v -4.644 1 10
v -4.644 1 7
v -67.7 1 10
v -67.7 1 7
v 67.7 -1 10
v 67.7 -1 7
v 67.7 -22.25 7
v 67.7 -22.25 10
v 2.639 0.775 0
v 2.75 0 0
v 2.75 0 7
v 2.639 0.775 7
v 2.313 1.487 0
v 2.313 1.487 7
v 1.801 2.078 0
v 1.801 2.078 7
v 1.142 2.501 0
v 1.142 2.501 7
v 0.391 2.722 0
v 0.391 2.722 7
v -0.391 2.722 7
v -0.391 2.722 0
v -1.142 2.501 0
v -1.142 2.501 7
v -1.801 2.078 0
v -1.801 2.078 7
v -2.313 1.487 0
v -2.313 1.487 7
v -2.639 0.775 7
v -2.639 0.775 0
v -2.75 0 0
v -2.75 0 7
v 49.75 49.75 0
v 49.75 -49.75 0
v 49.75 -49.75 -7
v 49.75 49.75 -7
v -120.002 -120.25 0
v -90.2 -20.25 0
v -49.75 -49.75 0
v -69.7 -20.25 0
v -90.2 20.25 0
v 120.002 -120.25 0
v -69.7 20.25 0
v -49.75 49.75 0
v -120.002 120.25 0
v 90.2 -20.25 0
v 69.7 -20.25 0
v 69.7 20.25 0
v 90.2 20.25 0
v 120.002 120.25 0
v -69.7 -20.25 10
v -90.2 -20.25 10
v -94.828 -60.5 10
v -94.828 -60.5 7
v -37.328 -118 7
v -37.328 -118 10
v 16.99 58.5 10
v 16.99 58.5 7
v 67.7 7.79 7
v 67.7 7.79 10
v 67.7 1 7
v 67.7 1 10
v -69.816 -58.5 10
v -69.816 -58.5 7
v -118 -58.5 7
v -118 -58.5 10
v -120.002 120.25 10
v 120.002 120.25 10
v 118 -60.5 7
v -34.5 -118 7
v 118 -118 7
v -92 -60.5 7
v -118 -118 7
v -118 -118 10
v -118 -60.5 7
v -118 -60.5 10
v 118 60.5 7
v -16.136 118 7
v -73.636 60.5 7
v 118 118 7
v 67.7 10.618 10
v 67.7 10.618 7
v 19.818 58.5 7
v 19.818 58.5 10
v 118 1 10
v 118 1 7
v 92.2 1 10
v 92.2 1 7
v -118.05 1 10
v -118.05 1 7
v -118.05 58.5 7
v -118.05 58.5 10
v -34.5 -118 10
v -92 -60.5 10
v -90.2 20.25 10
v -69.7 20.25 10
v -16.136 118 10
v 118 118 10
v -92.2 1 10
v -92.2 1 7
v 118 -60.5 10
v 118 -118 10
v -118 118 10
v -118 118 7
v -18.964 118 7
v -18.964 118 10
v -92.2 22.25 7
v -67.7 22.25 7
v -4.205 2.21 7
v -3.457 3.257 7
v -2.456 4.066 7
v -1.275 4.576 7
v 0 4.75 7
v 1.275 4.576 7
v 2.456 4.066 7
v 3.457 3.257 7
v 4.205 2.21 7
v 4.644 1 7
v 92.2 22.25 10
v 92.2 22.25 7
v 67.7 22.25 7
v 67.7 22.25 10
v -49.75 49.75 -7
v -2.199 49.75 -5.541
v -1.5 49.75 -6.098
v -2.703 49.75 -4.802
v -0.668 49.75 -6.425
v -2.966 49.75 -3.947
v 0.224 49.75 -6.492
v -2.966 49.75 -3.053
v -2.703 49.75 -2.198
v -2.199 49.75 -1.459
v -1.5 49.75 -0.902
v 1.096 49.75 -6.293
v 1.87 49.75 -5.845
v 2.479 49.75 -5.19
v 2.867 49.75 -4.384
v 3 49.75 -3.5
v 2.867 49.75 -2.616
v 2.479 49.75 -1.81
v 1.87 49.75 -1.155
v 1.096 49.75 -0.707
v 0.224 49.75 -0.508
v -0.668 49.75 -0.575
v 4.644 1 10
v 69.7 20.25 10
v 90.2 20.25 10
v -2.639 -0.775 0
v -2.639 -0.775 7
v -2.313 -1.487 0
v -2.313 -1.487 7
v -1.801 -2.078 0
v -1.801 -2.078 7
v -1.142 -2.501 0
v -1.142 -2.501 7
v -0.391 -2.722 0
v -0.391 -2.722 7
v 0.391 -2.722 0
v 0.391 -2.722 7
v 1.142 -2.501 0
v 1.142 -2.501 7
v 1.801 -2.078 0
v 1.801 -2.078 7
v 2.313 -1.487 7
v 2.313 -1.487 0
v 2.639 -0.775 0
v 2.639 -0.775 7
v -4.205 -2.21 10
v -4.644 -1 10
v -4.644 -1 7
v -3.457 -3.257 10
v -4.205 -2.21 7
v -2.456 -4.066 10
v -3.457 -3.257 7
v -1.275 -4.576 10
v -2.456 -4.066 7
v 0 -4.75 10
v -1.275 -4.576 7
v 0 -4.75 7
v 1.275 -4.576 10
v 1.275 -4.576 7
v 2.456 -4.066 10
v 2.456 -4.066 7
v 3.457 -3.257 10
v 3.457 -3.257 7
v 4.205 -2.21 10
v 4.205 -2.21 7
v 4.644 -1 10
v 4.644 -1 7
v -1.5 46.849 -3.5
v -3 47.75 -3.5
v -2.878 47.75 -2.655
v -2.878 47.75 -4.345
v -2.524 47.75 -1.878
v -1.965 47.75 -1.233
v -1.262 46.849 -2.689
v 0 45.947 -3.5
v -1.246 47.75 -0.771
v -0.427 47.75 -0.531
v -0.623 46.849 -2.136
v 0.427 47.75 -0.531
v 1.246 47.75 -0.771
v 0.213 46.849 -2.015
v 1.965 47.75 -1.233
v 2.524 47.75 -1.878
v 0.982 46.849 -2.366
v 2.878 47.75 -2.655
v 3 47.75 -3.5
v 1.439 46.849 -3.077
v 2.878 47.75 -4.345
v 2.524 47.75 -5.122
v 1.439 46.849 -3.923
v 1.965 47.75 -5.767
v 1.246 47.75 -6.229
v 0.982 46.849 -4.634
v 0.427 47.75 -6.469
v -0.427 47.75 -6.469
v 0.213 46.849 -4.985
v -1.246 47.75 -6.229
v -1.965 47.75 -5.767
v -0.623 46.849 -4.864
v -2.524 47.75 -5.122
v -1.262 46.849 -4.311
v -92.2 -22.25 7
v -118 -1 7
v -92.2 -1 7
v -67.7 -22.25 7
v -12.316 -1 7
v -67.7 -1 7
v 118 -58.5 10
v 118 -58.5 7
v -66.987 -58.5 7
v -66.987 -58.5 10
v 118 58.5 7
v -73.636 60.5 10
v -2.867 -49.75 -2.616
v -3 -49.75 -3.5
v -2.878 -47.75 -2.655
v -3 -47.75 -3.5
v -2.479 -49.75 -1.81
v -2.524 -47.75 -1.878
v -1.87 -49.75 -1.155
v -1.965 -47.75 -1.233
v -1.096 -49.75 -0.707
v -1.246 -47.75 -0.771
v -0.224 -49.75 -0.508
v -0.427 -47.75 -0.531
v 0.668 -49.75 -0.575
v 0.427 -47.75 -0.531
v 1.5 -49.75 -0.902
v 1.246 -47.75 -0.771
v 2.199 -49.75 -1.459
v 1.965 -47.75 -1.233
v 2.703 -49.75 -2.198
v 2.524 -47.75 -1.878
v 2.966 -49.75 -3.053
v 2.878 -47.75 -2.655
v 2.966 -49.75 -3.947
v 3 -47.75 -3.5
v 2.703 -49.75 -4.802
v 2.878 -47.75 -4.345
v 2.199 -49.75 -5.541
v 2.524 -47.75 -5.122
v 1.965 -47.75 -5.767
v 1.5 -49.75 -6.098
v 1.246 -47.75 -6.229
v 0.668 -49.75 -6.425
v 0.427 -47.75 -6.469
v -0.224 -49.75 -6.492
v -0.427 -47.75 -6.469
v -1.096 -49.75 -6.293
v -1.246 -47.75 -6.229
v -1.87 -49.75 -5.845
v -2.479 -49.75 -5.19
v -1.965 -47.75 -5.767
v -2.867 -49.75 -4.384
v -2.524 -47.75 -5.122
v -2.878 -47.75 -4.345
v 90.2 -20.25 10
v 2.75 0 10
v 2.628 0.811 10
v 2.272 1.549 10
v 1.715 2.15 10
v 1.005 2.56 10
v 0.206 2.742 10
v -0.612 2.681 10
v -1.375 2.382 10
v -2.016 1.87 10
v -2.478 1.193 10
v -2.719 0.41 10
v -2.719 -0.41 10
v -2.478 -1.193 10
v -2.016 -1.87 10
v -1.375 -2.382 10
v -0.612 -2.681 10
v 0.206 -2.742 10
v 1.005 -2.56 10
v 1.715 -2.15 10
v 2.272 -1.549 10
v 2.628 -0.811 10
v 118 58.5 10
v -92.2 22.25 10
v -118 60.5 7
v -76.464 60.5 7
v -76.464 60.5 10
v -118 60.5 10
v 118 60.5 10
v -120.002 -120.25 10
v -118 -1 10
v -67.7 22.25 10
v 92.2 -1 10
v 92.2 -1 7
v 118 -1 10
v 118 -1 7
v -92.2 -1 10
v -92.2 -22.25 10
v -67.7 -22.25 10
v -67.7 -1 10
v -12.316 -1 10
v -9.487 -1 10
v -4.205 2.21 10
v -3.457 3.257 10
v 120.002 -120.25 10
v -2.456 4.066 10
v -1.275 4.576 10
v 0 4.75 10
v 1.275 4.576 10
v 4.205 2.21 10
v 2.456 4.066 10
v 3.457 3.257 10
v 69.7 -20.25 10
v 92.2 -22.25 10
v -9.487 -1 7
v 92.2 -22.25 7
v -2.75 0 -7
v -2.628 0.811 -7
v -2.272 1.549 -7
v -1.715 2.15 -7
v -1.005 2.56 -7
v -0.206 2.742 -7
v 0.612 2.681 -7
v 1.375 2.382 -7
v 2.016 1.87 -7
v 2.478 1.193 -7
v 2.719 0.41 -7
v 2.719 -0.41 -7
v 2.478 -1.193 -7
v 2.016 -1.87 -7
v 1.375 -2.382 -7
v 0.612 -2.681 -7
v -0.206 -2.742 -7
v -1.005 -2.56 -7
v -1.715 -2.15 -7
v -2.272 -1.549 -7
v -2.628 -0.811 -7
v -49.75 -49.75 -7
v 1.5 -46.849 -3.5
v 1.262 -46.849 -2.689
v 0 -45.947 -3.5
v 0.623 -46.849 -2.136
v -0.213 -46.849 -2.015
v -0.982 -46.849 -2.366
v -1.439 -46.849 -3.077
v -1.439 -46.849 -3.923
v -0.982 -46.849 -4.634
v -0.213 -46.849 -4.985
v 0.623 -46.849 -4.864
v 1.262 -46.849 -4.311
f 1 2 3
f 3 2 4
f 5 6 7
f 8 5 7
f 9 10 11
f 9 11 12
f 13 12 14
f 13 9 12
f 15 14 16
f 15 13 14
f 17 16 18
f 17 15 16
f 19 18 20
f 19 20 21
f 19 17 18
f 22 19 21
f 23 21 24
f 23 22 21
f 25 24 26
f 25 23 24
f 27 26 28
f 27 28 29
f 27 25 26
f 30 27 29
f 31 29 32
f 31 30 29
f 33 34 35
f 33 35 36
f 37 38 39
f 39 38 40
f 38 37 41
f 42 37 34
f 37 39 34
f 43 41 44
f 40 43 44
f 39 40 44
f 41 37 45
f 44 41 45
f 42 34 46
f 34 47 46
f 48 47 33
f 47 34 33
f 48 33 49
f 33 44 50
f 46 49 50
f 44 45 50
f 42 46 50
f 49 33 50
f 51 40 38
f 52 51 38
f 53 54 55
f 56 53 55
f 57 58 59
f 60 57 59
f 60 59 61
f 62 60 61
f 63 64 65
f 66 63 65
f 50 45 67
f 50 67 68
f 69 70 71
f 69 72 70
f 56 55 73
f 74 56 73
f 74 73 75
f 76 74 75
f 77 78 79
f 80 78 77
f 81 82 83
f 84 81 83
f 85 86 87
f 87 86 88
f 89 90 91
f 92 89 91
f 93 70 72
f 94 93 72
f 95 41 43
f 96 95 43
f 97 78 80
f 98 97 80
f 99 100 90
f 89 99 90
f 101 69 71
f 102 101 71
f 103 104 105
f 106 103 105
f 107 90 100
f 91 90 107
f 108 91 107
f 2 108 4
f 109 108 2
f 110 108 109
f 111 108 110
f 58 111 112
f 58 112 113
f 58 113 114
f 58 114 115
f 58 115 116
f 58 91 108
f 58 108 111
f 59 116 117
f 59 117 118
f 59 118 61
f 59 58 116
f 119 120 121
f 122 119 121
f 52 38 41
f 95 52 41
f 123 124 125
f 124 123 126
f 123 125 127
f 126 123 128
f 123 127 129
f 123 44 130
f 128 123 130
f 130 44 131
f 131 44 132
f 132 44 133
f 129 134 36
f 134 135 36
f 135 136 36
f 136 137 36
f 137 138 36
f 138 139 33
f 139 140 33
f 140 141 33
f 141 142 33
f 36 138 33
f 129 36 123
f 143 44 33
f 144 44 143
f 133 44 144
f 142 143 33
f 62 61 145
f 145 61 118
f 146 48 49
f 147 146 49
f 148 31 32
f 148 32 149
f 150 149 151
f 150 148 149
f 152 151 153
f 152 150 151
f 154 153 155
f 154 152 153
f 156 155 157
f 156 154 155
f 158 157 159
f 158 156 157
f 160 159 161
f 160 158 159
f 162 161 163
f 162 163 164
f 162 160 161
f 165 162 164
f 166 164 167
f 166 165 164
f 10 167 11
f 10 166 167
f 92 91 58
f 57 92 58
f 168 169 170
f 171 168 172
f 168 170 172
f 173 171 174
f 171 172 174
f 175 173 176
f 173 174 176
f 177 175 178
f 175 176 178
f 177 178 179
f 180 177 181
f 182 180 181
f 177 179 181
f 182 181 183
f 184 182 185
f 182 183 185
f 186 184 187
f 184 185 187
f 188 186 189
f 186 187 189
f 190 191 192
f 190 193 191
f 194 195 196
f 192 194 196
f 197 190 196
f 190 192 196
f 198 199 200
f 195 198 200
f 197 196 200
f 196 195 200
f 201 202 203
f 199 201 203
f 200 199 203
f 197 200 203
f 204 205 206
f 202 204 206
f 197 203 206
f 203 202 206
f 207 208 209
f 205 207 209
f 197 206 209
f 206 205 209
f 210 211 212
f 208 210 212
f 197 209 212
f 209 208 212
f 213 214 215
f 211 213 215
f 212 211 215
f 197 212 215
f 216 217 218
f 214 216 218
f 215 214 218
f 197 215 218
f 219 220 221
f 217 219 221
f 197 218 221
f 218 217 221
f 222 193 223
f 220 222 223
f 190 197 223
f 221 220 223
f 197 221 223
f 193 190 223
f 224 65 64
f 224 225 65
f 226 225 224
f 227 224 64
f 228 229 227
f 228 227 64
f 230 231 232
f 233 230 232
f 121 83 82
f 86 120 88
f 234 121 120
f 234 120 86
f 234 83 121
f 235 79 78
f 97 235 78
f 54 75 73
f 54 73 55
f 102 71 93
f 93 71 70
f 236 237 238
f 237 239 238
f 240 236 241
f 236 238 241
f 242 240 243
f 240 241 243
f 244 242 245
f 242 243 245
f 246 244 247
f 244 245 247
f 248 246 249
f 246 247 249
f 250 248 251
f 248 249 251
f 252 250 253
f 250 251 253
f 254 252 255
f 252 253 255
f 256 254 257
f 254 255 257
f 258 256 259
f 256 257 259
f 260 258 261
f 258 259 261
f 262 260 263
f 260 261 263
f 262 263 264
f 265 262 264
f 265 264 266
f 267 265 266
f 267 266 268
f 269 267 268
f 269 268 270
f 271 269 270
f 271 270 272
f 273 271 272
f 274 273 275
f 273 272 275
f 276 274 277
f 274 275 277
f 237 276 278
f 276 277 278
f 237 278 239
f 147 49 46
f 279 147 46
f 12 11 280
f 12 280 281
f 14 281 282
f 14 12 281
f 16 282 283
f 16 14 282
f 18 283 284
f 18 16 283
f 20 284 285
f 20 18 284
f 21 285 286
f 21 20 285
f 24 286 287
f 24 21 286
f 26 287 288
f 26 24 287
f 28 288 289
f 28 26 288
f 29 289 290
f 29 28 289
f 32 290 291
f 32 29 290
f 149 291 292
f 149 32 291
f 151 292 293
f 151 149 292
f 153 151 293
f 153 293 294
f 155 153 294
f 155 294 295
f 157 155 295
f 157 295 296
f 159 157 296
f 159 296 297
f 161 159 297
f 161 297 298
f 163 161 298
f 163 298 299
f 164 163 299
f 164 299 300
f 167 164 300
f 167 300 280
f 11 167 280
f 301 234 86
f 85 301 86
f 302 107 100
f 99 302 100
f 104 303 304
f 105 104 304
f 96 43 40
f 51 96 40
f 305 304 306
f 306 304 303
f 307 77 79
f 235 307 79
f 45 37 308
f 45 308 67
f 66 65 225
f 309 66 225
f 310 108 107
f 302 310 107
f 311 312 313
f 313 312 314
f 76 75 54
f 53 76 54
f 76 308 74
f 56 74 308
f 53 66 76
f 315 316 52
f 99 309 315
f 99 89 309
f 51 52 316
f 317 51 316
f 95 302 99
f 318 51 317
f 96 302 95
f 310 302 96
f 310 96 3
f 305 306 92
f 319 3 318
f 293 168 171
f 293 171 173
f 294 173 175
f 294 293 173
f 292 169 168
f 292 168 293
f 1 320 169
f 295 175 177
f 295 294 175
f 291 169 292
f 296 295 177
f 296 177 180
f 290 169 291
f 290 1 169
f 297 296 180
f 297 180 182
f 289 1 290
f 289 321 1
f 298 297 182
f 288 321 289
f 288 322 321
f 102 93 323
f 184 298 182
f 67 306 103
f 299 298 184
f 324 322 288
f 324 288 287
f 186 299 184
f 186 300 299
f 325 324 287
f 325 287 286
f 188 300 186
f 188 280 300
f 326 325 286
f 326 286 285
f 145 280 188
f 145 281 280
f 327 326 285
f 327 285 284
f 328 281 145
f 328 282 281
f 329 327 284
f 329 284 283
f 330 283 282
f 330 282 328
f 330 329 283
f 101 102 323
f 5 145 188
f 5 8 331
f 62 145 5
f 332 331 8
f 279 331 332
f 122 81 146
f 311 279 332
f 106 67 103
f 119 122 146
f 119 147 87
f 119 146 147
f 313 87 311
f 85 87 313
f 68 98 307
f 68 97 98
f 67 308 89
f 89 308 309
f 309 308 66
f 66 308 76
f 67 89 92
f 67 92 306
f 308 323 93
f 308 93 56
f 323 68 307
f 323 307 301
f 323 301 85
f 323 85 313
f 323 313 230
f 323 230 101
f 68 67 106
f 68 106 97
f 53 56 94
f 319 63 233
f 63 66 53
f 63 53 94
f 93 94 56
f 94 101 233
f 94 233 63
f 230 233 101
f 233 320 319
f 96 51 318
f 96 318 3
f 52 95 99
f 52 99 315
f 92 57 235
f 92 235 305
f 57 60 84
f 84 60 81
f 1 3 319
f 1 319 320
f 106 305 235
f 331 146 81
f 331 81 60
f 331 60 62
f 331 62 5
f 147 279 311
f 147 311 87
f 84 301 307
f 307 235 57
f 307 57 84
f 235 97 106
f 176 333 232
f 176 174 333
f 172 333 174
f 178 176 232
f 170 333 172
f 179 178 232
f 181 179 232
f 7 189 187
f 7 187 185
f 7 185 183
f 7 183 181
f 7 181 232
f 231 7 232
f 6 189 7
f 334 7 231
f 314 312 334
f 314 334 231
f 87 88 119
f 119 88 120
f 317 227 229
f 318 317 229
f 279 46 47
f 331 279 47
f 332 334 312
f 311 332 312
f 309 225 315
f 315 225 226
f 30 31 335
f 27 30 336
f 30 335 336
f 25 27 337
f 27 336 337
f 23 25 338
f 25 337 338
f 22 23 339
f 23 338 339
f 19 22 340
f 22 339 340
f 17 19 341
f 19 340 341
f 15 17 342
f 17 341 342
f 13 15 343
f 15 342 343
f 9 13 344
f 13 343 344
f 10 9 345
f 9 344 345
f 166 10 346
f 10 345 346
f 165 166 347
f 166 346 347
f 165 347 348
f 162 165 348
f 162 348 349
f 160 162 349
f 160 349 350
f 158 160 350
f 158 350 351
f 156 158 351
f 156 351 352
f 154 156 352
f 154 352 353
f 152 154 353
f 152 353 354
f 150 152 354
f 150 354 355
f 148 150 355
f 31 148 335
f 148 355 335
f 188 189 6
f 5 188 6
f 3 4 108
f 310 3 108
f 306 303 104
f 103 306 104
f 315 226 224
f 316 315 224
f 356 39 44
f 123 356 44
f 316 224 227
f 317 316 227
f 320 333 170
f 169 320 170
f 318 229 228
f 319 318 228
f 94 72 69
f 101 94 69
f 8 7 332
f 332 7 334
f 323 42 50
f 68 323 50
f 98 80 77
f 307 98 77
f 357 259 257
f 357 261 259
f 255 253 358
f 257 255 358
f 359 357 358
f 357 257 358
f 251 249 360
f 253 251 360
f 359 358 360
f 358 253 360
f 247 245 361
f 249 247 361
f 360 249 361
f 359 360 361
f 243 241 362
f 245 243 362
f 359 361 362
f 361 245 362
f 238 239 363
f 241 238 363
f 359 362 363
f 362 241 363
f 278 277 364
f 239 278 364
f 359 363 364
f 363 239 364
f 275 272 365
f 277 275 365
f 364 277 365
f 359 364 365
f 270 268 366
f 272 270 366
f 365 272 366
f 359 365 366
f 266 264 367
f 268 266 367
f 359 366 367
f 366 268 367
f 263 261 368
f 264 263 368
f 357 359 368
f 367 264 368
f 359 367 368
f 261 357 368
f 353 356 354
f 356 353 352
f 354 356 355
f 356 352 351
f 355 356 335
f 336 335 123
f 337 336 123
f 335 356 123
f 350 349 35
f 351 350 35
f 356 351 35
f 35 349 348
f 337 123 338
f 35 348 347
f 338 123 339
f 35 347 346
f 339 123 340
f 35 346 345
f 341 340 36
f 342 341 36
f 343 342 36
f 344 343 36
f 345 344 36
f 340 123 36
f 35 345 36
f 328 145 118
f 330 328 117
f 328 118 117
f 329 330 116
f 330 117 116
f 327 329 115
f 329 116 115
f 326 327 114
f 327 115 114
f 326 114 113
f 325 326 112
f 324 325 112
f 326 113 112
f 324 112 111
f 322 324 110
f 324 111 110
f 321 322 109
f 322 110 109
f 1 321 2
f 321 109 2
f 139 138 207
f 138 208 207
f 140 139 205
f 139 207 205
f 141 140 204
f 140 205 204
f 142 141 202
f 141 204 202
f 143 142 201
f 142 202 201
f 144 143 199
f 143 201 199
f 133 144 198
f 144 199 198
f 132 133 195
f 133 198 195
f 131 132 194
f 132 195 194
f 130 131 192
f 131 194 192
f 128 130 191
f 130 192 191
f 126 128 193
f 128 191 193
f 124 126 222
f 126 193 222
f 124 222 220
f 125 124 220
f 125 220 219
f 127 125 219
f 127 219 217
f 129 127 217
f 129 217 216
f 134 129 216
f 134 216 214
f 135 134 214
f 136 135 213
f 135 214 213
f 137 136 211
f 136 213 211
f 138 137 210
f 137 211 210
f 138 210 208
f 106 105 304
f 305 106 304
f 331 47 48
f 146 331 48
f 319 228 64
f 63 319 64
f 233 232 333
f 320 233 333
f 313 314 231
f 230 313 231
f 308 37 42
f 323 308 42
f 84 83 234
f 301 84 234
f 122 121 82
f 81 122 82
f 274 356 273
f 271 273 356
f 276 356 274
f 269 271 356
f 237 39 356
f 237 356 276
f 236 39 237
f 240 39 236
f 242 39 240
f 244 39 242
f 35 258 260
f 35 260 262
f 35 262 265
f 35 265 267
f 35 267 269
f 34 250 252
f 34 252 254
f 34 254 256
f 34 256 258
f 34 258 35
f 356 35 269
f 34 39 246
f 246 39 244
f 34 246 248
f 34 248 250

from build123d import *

# Parameters (mm, degrees)
F0_W     = 240.0041820114
F0_H     = 240.5
F0_R     = 2.75
F2_DEPTH = 7
F1_W     = 99.5
F1_H     = 99.5
F3_DEPTH = 7
F4_D     = 5.5
F4_DEPTH = 60
F4_TIP   = 1.6523667023
F5_DEPTH = 10
F7_D     = 6
F7_DEPTH = 2
F7_TIP   = 1.8025818571
F9_D     = 6
F9_DEPTH = 2
F9_TIP   = 1.8025818571


# Not quite as in the source:
# - a feature names something its author has since deleted; it is built from what else it names


with BuildPart() as f2:
    # F0 (on Top) → F2 (new body)
    with BuildSketch(Plane.XY):
        Rectangle(F0_W, F0_H)
        Polygon((-118, -60.5), (-94.8284271247, -60.5), (-37.3284271247, -118), (-118, -118), align=None, mode=Mode.SUBTRACT)
        Polygon((-69.8158430413, -58.5), (-118, -58.5), (-118, -1), (-92.2, -1), (-92.2, -22.25), (-67.7, -22.25), (-67.7, -1), (-12.3158430413, -1), align=None, mode=Mode.SUBTRACT)
        Polygon((118, -118), (-34.5, -118), (-92, -60.5), (118, -60.5), align=None, mode=Mode.SUBTRACT)
        with BuildLine():
            Line((118, -1), (118, -58.5))
            Line((118, -58.5), (-66.9874159165, -58.5))
            Line((-66.9874159165, -58.5), (-9.4874159165, -1))
            Line((-9.4874159165, -1), (-4.6435439053, -1))
            ThreePointArc((-4.6435439053, -1), (0, -4.75), (4.6435439053, -1))
            Line((4.6435439053, -1), (67.6999996539, -1))
            Line((67.6999996539, -1), (67.699995977, -22.25))
            Line((67.699995977, -22.25), (92.2, -22.25))
            Line((92.2, -22.25), (92.2, -1))
            Line((92.2, -1), (118, -1))
        make_face(mode=Mode.SUBTRACT)
        Polygon((-69.7, 20.25), (-69.7, 0), (-69.7, -20.25), (-90.2, -20.25), (-90.2, 0), (-90.2, 20.25), align=None, mode=Mode.SUBTRACT)
        with BuildLine():
            Line((-118.05, 1), (-118.05, 58.5))
            Line((-118.05, 58.5), (16.9895635103, 58.5))
            Line((16.9895635103, 58.5), (67.7, 7.7895635103))
            Line((67.7, 7.7895635103), (67.7, 1))
            Line((67.7, 1), (4.6435439053, 1))
            ThreePointArc((4.6435439053, 1), (0, 4.75), (-4.6435439053, 1))
            Line((-4.6435439053, 1), (-67.7, 1))
            Line((-67.7, 1), (-67.7, 22.25))
            Line((-67.7, 22.25), (-92.2, 22.25))
            Line((-92.2, 22.25), (-92.2, 1))
            Line((-92.2, 1), (-118.05, 1))
        make_face(mode=Mode.SUBTRACT)
        Polygon((-118, 60.5), (-118, 118), (-18.9642378869, 118), (-76.4642378869, 60.5), align=None, mode=Mode.SUBTRACT)
        Circle(F0_R, mode=Mode.SUBTRACT)
        Polygon((69.7, -20.25), (69.7, -2.25), (69.7, 20.25), (90.2, 20.25), (90.2, -2.25), (90.2, -20.25), align=None, mode=Mode.SUBTRACT)
        Polygon((67.7, 22.25), (67.7, 10.617990635), (19.817990635, 58.5), (118, 58.5), (118, 0.9999998737), (92.2, 0.9999998737), (92.2, 22.25), align=None, mode=Mode.SUBTRACT)
        Polygon((118, 118), (118, 60.5), (-73.6358107621, 60.5), (-16.1358107621, 118), align=None, mode=Mode.SUBTRACT)
        Polygon((-92, -60.5), (-34.5, -118), (118, -118), (118, -60.5), align=None)
        Polygon((-73.6358107621, 60.5), (118, 60.5), (118, 118), (-16.1358107621, 118), align=None)
        with BuildLine():
            Line((16.9895635103, 58.5), (-118.05, 58.5))
            Line((-118.05, 58.5), (-118.05, 1))
            Line((-118.05, 1), (-92.2, 1))
            Line((-92.2, 1), (-92.2, 22.25))
            Line((-92.2, 22.25), (-67.7, 22.25))
            Line((-67.7, 22.25), (-67.7, 1))
            Line((-67.7, 1), (-4.6435439053, 1))
            ThreePointArc((-4.6435439053, 1), (0, 4.75), (4.6435439053, 1))
            Line((4.6435439053, 1), (67.7, 1))
            Line((67.7, 1), (67.7, 7.7895635103))
            Line((67.7, 7.7895635103), (16.9895635103, 58.5))
        make_face()
        with BuildLine():
            Line((-66.9874159165, -58.5), (118, -58.5))
            Line((118, -58.5), (118, -1))
            Line((118, -1), (92.2, -1))
            Line((92.2, -1), (92.2, -22.25))
            Line((92.2, -22.25), (67.699995977, -22.25))
            Line((67.699995977, -22.25), (67.6999996539, -1))
            Line((67.6999996539, -1), (4.6435439053, -1))
            ThreePointArc((4.6435439053, -1), (0, -4.75), (-4.6435439053, -1))
            Line((-4.6435439053, -1), (-9.4874159165, -1))
            Line((-9.4874159165, -1), (-66.9874159165, -58.5))
        make_face()
        Polygon((-18.9642378869, 118), (-118, 118), (-118, 60.5), (-76.4642378869, 60.5), align=None)
        Polygon((-118, -1), (-118, -58.5), (-69.8158430413, -58.5), (-12.3158430413, -1), (-67.7, -1), (-67.7, -22.25), (-92.2, -22.25), (-92.2, -1), align=None)
        Polygon((19.817990635, 58.5), (67.7, 10.617990635), (67.7, 22.25), (92.2, 22.25), (92.2, 0.9999998737), (118, 0.9999998737), (118, 58.5), align=None)
        Polygon((-37.3284271247, -118), (-94.8284271247, -60.5), (-118, -60.5), (-118, -118), align=None)
    extrude(amount=F2_DEPTH)

    # F1 (on Top) → F3 (join)
    with BuildSketch(Plane.XY):
        Rectangle(F1_W, F1_H)
    extrude(amount=-F3_DEPTH)

    # F4
    with Locations(Plane.XY):
        with Locations((0, 0)):
            Hole(F4_D / 2, depth=F4_DEPTH)
            with Locations((0, 0, -(F4_DEPTH + F4_TIP / 2))):  # 118° drill point
                Cone(0, F4_D / 2, F4_TIP, mode=Mode.SUBTRACT)

    # F0 (on Top) → F5 (join)
    with BuildSketch(Plane.XY):
        Rectangle(F0_W, F0_H)
        Polygon((-118, -60.5), (-94.8284271247, -60.5), (-37.3284271247, -118), (-118, -118), align=None, mode=Mode.SUBTRACT)
        Polygon((-69.8158430413, -58.5), (-118, -58.5), (-118, -1), (-92.2, -1), (-92.2, -22.25), (-67.7, -22.25), (-67.7, -1), (-12.3158430413, -1), align=None, mode=Mode.SUBTRACT)
        Polygon((118, -118), (-34.5, -118), (-92, -60.5), (118, -60.5), align=None, mode=Mode.SUBTRACT)
        with BuildLine():
            Line((118, -1), (118, -58.5))
            Line((118, -58.5), (-66.9874159165, -58.5))
            Line((-66.9874159165, -58.5), (-9.4874159165, -1))
            Line((-9.4874159165, -1), (-4.6435439053, -1))
            ThreePointArc((-4.6435439053, -1), (0, -4.75), (4.6435439053, -1))
            Line((4.6435439053, -1), (67.6999996539, -1))
            Line((67.6999996539, -1), (67.699995977, -22.25))
            Line((67.699995977, -22.25), (92.2, -22.25))
            Line((92.2, -22.25), (92.2, -1))
            Line((92.2, -1), (118, -1))
        make_face(mode=Mode.SUBTRACT)
        Polygon((-69.7, 20.25), (-69.7, 0), (-69.7, -20.25), (-90.2, -20.25), (-90.2, 0), (-90.2, 20.25), align=None, mode=Mode.SUBTRACT)
        with BuildLine():
            Line((-118.05, 1), (-118.05, 58.5))
            Line((-118.05, 58.5), (16.9895635103, 58.5))
            Line((16.9895635103, 58.5), (67.7, 7.7895635103))
            Line((67.7, 7.7895635103), (67.7, 1))
            Line((67.7, 1), (4.6435439053, 1))
            ThreePointArc((4.6435439053, 1), (0, 4.75), (-4.6435439053, 1))
            Line((-4.6435439053, 1), (-67.7, 1))
            Line((-67.7, 1), (-67.7, 22.25))
            Line((-67.7, 22.25), (-92.2, 22.25))
            Line((-92.2, 22.25), (-92.2, 1))
            Line((-92.2, 1), (-118.05, 1))
        make_face(mode=Mode.SUBTRACT)
        Polygon((-118, 60.5), (-118, 118), (-18.9642378869, 118), (-76.4642378869, 60.5), align=None, mode=Mode.SUBTRACT)
        Circle(F0_R, mode=Mode.SUBTRACT)
        Polygon((69.7, -20.25), (69.7, -2.25), (69.7, 20.25), (90.2, 20.25), (90.2, -2.25), (90.2, -20.25), align=None, mode=Mode.SUBTRACT)
        Polygon((67.7, 22.25), (67.7, 10.617990635), (19.817990635, 58.5), (118, 58.5), (118, 0.9999998737), (92.2, 0.9999998737), (92.2, 22.25), align=None, mode=Mode.SUBTRACT)
        Polygon((118, 118), (118, 60.5), (-73.6358107621, 60.5), (-16.1358107621, 118), align=None, mode=Mode.SUBTRACT)
    extrude(amount=F5_DEPTH)

    # F7
    with Locations(Plane.XZ.offset(49.75)):
        with Locations((0, -3.5)):
            Hole(F7_D / 2, depth=F7_DEPTH)
            with Locations((0, 0, -(F7_DEPTH + F7_TIP / 2))):  # 118° drill point
                Cone(0, F7_D / 2, F7_TIP, mode=Mode.SUBTRACT)

    # F9
    with Locations(Plane(origin=(0, 49.75, 0), x_dir=(-1, 0, 0), z_dir=(0, 1, 0))):
        with Locations((0, -3.5)):
            Hole(F9_D / 2, depth=F9_DEPTH)
            with Locations((0, 0, -(F9_DEPTH + F9_TIP / 2))):  # 118° drill point
                Cone(0, F9_D / 2, F9_TIP, mode=Mode.SUBTRACT)


solid = f2.part
